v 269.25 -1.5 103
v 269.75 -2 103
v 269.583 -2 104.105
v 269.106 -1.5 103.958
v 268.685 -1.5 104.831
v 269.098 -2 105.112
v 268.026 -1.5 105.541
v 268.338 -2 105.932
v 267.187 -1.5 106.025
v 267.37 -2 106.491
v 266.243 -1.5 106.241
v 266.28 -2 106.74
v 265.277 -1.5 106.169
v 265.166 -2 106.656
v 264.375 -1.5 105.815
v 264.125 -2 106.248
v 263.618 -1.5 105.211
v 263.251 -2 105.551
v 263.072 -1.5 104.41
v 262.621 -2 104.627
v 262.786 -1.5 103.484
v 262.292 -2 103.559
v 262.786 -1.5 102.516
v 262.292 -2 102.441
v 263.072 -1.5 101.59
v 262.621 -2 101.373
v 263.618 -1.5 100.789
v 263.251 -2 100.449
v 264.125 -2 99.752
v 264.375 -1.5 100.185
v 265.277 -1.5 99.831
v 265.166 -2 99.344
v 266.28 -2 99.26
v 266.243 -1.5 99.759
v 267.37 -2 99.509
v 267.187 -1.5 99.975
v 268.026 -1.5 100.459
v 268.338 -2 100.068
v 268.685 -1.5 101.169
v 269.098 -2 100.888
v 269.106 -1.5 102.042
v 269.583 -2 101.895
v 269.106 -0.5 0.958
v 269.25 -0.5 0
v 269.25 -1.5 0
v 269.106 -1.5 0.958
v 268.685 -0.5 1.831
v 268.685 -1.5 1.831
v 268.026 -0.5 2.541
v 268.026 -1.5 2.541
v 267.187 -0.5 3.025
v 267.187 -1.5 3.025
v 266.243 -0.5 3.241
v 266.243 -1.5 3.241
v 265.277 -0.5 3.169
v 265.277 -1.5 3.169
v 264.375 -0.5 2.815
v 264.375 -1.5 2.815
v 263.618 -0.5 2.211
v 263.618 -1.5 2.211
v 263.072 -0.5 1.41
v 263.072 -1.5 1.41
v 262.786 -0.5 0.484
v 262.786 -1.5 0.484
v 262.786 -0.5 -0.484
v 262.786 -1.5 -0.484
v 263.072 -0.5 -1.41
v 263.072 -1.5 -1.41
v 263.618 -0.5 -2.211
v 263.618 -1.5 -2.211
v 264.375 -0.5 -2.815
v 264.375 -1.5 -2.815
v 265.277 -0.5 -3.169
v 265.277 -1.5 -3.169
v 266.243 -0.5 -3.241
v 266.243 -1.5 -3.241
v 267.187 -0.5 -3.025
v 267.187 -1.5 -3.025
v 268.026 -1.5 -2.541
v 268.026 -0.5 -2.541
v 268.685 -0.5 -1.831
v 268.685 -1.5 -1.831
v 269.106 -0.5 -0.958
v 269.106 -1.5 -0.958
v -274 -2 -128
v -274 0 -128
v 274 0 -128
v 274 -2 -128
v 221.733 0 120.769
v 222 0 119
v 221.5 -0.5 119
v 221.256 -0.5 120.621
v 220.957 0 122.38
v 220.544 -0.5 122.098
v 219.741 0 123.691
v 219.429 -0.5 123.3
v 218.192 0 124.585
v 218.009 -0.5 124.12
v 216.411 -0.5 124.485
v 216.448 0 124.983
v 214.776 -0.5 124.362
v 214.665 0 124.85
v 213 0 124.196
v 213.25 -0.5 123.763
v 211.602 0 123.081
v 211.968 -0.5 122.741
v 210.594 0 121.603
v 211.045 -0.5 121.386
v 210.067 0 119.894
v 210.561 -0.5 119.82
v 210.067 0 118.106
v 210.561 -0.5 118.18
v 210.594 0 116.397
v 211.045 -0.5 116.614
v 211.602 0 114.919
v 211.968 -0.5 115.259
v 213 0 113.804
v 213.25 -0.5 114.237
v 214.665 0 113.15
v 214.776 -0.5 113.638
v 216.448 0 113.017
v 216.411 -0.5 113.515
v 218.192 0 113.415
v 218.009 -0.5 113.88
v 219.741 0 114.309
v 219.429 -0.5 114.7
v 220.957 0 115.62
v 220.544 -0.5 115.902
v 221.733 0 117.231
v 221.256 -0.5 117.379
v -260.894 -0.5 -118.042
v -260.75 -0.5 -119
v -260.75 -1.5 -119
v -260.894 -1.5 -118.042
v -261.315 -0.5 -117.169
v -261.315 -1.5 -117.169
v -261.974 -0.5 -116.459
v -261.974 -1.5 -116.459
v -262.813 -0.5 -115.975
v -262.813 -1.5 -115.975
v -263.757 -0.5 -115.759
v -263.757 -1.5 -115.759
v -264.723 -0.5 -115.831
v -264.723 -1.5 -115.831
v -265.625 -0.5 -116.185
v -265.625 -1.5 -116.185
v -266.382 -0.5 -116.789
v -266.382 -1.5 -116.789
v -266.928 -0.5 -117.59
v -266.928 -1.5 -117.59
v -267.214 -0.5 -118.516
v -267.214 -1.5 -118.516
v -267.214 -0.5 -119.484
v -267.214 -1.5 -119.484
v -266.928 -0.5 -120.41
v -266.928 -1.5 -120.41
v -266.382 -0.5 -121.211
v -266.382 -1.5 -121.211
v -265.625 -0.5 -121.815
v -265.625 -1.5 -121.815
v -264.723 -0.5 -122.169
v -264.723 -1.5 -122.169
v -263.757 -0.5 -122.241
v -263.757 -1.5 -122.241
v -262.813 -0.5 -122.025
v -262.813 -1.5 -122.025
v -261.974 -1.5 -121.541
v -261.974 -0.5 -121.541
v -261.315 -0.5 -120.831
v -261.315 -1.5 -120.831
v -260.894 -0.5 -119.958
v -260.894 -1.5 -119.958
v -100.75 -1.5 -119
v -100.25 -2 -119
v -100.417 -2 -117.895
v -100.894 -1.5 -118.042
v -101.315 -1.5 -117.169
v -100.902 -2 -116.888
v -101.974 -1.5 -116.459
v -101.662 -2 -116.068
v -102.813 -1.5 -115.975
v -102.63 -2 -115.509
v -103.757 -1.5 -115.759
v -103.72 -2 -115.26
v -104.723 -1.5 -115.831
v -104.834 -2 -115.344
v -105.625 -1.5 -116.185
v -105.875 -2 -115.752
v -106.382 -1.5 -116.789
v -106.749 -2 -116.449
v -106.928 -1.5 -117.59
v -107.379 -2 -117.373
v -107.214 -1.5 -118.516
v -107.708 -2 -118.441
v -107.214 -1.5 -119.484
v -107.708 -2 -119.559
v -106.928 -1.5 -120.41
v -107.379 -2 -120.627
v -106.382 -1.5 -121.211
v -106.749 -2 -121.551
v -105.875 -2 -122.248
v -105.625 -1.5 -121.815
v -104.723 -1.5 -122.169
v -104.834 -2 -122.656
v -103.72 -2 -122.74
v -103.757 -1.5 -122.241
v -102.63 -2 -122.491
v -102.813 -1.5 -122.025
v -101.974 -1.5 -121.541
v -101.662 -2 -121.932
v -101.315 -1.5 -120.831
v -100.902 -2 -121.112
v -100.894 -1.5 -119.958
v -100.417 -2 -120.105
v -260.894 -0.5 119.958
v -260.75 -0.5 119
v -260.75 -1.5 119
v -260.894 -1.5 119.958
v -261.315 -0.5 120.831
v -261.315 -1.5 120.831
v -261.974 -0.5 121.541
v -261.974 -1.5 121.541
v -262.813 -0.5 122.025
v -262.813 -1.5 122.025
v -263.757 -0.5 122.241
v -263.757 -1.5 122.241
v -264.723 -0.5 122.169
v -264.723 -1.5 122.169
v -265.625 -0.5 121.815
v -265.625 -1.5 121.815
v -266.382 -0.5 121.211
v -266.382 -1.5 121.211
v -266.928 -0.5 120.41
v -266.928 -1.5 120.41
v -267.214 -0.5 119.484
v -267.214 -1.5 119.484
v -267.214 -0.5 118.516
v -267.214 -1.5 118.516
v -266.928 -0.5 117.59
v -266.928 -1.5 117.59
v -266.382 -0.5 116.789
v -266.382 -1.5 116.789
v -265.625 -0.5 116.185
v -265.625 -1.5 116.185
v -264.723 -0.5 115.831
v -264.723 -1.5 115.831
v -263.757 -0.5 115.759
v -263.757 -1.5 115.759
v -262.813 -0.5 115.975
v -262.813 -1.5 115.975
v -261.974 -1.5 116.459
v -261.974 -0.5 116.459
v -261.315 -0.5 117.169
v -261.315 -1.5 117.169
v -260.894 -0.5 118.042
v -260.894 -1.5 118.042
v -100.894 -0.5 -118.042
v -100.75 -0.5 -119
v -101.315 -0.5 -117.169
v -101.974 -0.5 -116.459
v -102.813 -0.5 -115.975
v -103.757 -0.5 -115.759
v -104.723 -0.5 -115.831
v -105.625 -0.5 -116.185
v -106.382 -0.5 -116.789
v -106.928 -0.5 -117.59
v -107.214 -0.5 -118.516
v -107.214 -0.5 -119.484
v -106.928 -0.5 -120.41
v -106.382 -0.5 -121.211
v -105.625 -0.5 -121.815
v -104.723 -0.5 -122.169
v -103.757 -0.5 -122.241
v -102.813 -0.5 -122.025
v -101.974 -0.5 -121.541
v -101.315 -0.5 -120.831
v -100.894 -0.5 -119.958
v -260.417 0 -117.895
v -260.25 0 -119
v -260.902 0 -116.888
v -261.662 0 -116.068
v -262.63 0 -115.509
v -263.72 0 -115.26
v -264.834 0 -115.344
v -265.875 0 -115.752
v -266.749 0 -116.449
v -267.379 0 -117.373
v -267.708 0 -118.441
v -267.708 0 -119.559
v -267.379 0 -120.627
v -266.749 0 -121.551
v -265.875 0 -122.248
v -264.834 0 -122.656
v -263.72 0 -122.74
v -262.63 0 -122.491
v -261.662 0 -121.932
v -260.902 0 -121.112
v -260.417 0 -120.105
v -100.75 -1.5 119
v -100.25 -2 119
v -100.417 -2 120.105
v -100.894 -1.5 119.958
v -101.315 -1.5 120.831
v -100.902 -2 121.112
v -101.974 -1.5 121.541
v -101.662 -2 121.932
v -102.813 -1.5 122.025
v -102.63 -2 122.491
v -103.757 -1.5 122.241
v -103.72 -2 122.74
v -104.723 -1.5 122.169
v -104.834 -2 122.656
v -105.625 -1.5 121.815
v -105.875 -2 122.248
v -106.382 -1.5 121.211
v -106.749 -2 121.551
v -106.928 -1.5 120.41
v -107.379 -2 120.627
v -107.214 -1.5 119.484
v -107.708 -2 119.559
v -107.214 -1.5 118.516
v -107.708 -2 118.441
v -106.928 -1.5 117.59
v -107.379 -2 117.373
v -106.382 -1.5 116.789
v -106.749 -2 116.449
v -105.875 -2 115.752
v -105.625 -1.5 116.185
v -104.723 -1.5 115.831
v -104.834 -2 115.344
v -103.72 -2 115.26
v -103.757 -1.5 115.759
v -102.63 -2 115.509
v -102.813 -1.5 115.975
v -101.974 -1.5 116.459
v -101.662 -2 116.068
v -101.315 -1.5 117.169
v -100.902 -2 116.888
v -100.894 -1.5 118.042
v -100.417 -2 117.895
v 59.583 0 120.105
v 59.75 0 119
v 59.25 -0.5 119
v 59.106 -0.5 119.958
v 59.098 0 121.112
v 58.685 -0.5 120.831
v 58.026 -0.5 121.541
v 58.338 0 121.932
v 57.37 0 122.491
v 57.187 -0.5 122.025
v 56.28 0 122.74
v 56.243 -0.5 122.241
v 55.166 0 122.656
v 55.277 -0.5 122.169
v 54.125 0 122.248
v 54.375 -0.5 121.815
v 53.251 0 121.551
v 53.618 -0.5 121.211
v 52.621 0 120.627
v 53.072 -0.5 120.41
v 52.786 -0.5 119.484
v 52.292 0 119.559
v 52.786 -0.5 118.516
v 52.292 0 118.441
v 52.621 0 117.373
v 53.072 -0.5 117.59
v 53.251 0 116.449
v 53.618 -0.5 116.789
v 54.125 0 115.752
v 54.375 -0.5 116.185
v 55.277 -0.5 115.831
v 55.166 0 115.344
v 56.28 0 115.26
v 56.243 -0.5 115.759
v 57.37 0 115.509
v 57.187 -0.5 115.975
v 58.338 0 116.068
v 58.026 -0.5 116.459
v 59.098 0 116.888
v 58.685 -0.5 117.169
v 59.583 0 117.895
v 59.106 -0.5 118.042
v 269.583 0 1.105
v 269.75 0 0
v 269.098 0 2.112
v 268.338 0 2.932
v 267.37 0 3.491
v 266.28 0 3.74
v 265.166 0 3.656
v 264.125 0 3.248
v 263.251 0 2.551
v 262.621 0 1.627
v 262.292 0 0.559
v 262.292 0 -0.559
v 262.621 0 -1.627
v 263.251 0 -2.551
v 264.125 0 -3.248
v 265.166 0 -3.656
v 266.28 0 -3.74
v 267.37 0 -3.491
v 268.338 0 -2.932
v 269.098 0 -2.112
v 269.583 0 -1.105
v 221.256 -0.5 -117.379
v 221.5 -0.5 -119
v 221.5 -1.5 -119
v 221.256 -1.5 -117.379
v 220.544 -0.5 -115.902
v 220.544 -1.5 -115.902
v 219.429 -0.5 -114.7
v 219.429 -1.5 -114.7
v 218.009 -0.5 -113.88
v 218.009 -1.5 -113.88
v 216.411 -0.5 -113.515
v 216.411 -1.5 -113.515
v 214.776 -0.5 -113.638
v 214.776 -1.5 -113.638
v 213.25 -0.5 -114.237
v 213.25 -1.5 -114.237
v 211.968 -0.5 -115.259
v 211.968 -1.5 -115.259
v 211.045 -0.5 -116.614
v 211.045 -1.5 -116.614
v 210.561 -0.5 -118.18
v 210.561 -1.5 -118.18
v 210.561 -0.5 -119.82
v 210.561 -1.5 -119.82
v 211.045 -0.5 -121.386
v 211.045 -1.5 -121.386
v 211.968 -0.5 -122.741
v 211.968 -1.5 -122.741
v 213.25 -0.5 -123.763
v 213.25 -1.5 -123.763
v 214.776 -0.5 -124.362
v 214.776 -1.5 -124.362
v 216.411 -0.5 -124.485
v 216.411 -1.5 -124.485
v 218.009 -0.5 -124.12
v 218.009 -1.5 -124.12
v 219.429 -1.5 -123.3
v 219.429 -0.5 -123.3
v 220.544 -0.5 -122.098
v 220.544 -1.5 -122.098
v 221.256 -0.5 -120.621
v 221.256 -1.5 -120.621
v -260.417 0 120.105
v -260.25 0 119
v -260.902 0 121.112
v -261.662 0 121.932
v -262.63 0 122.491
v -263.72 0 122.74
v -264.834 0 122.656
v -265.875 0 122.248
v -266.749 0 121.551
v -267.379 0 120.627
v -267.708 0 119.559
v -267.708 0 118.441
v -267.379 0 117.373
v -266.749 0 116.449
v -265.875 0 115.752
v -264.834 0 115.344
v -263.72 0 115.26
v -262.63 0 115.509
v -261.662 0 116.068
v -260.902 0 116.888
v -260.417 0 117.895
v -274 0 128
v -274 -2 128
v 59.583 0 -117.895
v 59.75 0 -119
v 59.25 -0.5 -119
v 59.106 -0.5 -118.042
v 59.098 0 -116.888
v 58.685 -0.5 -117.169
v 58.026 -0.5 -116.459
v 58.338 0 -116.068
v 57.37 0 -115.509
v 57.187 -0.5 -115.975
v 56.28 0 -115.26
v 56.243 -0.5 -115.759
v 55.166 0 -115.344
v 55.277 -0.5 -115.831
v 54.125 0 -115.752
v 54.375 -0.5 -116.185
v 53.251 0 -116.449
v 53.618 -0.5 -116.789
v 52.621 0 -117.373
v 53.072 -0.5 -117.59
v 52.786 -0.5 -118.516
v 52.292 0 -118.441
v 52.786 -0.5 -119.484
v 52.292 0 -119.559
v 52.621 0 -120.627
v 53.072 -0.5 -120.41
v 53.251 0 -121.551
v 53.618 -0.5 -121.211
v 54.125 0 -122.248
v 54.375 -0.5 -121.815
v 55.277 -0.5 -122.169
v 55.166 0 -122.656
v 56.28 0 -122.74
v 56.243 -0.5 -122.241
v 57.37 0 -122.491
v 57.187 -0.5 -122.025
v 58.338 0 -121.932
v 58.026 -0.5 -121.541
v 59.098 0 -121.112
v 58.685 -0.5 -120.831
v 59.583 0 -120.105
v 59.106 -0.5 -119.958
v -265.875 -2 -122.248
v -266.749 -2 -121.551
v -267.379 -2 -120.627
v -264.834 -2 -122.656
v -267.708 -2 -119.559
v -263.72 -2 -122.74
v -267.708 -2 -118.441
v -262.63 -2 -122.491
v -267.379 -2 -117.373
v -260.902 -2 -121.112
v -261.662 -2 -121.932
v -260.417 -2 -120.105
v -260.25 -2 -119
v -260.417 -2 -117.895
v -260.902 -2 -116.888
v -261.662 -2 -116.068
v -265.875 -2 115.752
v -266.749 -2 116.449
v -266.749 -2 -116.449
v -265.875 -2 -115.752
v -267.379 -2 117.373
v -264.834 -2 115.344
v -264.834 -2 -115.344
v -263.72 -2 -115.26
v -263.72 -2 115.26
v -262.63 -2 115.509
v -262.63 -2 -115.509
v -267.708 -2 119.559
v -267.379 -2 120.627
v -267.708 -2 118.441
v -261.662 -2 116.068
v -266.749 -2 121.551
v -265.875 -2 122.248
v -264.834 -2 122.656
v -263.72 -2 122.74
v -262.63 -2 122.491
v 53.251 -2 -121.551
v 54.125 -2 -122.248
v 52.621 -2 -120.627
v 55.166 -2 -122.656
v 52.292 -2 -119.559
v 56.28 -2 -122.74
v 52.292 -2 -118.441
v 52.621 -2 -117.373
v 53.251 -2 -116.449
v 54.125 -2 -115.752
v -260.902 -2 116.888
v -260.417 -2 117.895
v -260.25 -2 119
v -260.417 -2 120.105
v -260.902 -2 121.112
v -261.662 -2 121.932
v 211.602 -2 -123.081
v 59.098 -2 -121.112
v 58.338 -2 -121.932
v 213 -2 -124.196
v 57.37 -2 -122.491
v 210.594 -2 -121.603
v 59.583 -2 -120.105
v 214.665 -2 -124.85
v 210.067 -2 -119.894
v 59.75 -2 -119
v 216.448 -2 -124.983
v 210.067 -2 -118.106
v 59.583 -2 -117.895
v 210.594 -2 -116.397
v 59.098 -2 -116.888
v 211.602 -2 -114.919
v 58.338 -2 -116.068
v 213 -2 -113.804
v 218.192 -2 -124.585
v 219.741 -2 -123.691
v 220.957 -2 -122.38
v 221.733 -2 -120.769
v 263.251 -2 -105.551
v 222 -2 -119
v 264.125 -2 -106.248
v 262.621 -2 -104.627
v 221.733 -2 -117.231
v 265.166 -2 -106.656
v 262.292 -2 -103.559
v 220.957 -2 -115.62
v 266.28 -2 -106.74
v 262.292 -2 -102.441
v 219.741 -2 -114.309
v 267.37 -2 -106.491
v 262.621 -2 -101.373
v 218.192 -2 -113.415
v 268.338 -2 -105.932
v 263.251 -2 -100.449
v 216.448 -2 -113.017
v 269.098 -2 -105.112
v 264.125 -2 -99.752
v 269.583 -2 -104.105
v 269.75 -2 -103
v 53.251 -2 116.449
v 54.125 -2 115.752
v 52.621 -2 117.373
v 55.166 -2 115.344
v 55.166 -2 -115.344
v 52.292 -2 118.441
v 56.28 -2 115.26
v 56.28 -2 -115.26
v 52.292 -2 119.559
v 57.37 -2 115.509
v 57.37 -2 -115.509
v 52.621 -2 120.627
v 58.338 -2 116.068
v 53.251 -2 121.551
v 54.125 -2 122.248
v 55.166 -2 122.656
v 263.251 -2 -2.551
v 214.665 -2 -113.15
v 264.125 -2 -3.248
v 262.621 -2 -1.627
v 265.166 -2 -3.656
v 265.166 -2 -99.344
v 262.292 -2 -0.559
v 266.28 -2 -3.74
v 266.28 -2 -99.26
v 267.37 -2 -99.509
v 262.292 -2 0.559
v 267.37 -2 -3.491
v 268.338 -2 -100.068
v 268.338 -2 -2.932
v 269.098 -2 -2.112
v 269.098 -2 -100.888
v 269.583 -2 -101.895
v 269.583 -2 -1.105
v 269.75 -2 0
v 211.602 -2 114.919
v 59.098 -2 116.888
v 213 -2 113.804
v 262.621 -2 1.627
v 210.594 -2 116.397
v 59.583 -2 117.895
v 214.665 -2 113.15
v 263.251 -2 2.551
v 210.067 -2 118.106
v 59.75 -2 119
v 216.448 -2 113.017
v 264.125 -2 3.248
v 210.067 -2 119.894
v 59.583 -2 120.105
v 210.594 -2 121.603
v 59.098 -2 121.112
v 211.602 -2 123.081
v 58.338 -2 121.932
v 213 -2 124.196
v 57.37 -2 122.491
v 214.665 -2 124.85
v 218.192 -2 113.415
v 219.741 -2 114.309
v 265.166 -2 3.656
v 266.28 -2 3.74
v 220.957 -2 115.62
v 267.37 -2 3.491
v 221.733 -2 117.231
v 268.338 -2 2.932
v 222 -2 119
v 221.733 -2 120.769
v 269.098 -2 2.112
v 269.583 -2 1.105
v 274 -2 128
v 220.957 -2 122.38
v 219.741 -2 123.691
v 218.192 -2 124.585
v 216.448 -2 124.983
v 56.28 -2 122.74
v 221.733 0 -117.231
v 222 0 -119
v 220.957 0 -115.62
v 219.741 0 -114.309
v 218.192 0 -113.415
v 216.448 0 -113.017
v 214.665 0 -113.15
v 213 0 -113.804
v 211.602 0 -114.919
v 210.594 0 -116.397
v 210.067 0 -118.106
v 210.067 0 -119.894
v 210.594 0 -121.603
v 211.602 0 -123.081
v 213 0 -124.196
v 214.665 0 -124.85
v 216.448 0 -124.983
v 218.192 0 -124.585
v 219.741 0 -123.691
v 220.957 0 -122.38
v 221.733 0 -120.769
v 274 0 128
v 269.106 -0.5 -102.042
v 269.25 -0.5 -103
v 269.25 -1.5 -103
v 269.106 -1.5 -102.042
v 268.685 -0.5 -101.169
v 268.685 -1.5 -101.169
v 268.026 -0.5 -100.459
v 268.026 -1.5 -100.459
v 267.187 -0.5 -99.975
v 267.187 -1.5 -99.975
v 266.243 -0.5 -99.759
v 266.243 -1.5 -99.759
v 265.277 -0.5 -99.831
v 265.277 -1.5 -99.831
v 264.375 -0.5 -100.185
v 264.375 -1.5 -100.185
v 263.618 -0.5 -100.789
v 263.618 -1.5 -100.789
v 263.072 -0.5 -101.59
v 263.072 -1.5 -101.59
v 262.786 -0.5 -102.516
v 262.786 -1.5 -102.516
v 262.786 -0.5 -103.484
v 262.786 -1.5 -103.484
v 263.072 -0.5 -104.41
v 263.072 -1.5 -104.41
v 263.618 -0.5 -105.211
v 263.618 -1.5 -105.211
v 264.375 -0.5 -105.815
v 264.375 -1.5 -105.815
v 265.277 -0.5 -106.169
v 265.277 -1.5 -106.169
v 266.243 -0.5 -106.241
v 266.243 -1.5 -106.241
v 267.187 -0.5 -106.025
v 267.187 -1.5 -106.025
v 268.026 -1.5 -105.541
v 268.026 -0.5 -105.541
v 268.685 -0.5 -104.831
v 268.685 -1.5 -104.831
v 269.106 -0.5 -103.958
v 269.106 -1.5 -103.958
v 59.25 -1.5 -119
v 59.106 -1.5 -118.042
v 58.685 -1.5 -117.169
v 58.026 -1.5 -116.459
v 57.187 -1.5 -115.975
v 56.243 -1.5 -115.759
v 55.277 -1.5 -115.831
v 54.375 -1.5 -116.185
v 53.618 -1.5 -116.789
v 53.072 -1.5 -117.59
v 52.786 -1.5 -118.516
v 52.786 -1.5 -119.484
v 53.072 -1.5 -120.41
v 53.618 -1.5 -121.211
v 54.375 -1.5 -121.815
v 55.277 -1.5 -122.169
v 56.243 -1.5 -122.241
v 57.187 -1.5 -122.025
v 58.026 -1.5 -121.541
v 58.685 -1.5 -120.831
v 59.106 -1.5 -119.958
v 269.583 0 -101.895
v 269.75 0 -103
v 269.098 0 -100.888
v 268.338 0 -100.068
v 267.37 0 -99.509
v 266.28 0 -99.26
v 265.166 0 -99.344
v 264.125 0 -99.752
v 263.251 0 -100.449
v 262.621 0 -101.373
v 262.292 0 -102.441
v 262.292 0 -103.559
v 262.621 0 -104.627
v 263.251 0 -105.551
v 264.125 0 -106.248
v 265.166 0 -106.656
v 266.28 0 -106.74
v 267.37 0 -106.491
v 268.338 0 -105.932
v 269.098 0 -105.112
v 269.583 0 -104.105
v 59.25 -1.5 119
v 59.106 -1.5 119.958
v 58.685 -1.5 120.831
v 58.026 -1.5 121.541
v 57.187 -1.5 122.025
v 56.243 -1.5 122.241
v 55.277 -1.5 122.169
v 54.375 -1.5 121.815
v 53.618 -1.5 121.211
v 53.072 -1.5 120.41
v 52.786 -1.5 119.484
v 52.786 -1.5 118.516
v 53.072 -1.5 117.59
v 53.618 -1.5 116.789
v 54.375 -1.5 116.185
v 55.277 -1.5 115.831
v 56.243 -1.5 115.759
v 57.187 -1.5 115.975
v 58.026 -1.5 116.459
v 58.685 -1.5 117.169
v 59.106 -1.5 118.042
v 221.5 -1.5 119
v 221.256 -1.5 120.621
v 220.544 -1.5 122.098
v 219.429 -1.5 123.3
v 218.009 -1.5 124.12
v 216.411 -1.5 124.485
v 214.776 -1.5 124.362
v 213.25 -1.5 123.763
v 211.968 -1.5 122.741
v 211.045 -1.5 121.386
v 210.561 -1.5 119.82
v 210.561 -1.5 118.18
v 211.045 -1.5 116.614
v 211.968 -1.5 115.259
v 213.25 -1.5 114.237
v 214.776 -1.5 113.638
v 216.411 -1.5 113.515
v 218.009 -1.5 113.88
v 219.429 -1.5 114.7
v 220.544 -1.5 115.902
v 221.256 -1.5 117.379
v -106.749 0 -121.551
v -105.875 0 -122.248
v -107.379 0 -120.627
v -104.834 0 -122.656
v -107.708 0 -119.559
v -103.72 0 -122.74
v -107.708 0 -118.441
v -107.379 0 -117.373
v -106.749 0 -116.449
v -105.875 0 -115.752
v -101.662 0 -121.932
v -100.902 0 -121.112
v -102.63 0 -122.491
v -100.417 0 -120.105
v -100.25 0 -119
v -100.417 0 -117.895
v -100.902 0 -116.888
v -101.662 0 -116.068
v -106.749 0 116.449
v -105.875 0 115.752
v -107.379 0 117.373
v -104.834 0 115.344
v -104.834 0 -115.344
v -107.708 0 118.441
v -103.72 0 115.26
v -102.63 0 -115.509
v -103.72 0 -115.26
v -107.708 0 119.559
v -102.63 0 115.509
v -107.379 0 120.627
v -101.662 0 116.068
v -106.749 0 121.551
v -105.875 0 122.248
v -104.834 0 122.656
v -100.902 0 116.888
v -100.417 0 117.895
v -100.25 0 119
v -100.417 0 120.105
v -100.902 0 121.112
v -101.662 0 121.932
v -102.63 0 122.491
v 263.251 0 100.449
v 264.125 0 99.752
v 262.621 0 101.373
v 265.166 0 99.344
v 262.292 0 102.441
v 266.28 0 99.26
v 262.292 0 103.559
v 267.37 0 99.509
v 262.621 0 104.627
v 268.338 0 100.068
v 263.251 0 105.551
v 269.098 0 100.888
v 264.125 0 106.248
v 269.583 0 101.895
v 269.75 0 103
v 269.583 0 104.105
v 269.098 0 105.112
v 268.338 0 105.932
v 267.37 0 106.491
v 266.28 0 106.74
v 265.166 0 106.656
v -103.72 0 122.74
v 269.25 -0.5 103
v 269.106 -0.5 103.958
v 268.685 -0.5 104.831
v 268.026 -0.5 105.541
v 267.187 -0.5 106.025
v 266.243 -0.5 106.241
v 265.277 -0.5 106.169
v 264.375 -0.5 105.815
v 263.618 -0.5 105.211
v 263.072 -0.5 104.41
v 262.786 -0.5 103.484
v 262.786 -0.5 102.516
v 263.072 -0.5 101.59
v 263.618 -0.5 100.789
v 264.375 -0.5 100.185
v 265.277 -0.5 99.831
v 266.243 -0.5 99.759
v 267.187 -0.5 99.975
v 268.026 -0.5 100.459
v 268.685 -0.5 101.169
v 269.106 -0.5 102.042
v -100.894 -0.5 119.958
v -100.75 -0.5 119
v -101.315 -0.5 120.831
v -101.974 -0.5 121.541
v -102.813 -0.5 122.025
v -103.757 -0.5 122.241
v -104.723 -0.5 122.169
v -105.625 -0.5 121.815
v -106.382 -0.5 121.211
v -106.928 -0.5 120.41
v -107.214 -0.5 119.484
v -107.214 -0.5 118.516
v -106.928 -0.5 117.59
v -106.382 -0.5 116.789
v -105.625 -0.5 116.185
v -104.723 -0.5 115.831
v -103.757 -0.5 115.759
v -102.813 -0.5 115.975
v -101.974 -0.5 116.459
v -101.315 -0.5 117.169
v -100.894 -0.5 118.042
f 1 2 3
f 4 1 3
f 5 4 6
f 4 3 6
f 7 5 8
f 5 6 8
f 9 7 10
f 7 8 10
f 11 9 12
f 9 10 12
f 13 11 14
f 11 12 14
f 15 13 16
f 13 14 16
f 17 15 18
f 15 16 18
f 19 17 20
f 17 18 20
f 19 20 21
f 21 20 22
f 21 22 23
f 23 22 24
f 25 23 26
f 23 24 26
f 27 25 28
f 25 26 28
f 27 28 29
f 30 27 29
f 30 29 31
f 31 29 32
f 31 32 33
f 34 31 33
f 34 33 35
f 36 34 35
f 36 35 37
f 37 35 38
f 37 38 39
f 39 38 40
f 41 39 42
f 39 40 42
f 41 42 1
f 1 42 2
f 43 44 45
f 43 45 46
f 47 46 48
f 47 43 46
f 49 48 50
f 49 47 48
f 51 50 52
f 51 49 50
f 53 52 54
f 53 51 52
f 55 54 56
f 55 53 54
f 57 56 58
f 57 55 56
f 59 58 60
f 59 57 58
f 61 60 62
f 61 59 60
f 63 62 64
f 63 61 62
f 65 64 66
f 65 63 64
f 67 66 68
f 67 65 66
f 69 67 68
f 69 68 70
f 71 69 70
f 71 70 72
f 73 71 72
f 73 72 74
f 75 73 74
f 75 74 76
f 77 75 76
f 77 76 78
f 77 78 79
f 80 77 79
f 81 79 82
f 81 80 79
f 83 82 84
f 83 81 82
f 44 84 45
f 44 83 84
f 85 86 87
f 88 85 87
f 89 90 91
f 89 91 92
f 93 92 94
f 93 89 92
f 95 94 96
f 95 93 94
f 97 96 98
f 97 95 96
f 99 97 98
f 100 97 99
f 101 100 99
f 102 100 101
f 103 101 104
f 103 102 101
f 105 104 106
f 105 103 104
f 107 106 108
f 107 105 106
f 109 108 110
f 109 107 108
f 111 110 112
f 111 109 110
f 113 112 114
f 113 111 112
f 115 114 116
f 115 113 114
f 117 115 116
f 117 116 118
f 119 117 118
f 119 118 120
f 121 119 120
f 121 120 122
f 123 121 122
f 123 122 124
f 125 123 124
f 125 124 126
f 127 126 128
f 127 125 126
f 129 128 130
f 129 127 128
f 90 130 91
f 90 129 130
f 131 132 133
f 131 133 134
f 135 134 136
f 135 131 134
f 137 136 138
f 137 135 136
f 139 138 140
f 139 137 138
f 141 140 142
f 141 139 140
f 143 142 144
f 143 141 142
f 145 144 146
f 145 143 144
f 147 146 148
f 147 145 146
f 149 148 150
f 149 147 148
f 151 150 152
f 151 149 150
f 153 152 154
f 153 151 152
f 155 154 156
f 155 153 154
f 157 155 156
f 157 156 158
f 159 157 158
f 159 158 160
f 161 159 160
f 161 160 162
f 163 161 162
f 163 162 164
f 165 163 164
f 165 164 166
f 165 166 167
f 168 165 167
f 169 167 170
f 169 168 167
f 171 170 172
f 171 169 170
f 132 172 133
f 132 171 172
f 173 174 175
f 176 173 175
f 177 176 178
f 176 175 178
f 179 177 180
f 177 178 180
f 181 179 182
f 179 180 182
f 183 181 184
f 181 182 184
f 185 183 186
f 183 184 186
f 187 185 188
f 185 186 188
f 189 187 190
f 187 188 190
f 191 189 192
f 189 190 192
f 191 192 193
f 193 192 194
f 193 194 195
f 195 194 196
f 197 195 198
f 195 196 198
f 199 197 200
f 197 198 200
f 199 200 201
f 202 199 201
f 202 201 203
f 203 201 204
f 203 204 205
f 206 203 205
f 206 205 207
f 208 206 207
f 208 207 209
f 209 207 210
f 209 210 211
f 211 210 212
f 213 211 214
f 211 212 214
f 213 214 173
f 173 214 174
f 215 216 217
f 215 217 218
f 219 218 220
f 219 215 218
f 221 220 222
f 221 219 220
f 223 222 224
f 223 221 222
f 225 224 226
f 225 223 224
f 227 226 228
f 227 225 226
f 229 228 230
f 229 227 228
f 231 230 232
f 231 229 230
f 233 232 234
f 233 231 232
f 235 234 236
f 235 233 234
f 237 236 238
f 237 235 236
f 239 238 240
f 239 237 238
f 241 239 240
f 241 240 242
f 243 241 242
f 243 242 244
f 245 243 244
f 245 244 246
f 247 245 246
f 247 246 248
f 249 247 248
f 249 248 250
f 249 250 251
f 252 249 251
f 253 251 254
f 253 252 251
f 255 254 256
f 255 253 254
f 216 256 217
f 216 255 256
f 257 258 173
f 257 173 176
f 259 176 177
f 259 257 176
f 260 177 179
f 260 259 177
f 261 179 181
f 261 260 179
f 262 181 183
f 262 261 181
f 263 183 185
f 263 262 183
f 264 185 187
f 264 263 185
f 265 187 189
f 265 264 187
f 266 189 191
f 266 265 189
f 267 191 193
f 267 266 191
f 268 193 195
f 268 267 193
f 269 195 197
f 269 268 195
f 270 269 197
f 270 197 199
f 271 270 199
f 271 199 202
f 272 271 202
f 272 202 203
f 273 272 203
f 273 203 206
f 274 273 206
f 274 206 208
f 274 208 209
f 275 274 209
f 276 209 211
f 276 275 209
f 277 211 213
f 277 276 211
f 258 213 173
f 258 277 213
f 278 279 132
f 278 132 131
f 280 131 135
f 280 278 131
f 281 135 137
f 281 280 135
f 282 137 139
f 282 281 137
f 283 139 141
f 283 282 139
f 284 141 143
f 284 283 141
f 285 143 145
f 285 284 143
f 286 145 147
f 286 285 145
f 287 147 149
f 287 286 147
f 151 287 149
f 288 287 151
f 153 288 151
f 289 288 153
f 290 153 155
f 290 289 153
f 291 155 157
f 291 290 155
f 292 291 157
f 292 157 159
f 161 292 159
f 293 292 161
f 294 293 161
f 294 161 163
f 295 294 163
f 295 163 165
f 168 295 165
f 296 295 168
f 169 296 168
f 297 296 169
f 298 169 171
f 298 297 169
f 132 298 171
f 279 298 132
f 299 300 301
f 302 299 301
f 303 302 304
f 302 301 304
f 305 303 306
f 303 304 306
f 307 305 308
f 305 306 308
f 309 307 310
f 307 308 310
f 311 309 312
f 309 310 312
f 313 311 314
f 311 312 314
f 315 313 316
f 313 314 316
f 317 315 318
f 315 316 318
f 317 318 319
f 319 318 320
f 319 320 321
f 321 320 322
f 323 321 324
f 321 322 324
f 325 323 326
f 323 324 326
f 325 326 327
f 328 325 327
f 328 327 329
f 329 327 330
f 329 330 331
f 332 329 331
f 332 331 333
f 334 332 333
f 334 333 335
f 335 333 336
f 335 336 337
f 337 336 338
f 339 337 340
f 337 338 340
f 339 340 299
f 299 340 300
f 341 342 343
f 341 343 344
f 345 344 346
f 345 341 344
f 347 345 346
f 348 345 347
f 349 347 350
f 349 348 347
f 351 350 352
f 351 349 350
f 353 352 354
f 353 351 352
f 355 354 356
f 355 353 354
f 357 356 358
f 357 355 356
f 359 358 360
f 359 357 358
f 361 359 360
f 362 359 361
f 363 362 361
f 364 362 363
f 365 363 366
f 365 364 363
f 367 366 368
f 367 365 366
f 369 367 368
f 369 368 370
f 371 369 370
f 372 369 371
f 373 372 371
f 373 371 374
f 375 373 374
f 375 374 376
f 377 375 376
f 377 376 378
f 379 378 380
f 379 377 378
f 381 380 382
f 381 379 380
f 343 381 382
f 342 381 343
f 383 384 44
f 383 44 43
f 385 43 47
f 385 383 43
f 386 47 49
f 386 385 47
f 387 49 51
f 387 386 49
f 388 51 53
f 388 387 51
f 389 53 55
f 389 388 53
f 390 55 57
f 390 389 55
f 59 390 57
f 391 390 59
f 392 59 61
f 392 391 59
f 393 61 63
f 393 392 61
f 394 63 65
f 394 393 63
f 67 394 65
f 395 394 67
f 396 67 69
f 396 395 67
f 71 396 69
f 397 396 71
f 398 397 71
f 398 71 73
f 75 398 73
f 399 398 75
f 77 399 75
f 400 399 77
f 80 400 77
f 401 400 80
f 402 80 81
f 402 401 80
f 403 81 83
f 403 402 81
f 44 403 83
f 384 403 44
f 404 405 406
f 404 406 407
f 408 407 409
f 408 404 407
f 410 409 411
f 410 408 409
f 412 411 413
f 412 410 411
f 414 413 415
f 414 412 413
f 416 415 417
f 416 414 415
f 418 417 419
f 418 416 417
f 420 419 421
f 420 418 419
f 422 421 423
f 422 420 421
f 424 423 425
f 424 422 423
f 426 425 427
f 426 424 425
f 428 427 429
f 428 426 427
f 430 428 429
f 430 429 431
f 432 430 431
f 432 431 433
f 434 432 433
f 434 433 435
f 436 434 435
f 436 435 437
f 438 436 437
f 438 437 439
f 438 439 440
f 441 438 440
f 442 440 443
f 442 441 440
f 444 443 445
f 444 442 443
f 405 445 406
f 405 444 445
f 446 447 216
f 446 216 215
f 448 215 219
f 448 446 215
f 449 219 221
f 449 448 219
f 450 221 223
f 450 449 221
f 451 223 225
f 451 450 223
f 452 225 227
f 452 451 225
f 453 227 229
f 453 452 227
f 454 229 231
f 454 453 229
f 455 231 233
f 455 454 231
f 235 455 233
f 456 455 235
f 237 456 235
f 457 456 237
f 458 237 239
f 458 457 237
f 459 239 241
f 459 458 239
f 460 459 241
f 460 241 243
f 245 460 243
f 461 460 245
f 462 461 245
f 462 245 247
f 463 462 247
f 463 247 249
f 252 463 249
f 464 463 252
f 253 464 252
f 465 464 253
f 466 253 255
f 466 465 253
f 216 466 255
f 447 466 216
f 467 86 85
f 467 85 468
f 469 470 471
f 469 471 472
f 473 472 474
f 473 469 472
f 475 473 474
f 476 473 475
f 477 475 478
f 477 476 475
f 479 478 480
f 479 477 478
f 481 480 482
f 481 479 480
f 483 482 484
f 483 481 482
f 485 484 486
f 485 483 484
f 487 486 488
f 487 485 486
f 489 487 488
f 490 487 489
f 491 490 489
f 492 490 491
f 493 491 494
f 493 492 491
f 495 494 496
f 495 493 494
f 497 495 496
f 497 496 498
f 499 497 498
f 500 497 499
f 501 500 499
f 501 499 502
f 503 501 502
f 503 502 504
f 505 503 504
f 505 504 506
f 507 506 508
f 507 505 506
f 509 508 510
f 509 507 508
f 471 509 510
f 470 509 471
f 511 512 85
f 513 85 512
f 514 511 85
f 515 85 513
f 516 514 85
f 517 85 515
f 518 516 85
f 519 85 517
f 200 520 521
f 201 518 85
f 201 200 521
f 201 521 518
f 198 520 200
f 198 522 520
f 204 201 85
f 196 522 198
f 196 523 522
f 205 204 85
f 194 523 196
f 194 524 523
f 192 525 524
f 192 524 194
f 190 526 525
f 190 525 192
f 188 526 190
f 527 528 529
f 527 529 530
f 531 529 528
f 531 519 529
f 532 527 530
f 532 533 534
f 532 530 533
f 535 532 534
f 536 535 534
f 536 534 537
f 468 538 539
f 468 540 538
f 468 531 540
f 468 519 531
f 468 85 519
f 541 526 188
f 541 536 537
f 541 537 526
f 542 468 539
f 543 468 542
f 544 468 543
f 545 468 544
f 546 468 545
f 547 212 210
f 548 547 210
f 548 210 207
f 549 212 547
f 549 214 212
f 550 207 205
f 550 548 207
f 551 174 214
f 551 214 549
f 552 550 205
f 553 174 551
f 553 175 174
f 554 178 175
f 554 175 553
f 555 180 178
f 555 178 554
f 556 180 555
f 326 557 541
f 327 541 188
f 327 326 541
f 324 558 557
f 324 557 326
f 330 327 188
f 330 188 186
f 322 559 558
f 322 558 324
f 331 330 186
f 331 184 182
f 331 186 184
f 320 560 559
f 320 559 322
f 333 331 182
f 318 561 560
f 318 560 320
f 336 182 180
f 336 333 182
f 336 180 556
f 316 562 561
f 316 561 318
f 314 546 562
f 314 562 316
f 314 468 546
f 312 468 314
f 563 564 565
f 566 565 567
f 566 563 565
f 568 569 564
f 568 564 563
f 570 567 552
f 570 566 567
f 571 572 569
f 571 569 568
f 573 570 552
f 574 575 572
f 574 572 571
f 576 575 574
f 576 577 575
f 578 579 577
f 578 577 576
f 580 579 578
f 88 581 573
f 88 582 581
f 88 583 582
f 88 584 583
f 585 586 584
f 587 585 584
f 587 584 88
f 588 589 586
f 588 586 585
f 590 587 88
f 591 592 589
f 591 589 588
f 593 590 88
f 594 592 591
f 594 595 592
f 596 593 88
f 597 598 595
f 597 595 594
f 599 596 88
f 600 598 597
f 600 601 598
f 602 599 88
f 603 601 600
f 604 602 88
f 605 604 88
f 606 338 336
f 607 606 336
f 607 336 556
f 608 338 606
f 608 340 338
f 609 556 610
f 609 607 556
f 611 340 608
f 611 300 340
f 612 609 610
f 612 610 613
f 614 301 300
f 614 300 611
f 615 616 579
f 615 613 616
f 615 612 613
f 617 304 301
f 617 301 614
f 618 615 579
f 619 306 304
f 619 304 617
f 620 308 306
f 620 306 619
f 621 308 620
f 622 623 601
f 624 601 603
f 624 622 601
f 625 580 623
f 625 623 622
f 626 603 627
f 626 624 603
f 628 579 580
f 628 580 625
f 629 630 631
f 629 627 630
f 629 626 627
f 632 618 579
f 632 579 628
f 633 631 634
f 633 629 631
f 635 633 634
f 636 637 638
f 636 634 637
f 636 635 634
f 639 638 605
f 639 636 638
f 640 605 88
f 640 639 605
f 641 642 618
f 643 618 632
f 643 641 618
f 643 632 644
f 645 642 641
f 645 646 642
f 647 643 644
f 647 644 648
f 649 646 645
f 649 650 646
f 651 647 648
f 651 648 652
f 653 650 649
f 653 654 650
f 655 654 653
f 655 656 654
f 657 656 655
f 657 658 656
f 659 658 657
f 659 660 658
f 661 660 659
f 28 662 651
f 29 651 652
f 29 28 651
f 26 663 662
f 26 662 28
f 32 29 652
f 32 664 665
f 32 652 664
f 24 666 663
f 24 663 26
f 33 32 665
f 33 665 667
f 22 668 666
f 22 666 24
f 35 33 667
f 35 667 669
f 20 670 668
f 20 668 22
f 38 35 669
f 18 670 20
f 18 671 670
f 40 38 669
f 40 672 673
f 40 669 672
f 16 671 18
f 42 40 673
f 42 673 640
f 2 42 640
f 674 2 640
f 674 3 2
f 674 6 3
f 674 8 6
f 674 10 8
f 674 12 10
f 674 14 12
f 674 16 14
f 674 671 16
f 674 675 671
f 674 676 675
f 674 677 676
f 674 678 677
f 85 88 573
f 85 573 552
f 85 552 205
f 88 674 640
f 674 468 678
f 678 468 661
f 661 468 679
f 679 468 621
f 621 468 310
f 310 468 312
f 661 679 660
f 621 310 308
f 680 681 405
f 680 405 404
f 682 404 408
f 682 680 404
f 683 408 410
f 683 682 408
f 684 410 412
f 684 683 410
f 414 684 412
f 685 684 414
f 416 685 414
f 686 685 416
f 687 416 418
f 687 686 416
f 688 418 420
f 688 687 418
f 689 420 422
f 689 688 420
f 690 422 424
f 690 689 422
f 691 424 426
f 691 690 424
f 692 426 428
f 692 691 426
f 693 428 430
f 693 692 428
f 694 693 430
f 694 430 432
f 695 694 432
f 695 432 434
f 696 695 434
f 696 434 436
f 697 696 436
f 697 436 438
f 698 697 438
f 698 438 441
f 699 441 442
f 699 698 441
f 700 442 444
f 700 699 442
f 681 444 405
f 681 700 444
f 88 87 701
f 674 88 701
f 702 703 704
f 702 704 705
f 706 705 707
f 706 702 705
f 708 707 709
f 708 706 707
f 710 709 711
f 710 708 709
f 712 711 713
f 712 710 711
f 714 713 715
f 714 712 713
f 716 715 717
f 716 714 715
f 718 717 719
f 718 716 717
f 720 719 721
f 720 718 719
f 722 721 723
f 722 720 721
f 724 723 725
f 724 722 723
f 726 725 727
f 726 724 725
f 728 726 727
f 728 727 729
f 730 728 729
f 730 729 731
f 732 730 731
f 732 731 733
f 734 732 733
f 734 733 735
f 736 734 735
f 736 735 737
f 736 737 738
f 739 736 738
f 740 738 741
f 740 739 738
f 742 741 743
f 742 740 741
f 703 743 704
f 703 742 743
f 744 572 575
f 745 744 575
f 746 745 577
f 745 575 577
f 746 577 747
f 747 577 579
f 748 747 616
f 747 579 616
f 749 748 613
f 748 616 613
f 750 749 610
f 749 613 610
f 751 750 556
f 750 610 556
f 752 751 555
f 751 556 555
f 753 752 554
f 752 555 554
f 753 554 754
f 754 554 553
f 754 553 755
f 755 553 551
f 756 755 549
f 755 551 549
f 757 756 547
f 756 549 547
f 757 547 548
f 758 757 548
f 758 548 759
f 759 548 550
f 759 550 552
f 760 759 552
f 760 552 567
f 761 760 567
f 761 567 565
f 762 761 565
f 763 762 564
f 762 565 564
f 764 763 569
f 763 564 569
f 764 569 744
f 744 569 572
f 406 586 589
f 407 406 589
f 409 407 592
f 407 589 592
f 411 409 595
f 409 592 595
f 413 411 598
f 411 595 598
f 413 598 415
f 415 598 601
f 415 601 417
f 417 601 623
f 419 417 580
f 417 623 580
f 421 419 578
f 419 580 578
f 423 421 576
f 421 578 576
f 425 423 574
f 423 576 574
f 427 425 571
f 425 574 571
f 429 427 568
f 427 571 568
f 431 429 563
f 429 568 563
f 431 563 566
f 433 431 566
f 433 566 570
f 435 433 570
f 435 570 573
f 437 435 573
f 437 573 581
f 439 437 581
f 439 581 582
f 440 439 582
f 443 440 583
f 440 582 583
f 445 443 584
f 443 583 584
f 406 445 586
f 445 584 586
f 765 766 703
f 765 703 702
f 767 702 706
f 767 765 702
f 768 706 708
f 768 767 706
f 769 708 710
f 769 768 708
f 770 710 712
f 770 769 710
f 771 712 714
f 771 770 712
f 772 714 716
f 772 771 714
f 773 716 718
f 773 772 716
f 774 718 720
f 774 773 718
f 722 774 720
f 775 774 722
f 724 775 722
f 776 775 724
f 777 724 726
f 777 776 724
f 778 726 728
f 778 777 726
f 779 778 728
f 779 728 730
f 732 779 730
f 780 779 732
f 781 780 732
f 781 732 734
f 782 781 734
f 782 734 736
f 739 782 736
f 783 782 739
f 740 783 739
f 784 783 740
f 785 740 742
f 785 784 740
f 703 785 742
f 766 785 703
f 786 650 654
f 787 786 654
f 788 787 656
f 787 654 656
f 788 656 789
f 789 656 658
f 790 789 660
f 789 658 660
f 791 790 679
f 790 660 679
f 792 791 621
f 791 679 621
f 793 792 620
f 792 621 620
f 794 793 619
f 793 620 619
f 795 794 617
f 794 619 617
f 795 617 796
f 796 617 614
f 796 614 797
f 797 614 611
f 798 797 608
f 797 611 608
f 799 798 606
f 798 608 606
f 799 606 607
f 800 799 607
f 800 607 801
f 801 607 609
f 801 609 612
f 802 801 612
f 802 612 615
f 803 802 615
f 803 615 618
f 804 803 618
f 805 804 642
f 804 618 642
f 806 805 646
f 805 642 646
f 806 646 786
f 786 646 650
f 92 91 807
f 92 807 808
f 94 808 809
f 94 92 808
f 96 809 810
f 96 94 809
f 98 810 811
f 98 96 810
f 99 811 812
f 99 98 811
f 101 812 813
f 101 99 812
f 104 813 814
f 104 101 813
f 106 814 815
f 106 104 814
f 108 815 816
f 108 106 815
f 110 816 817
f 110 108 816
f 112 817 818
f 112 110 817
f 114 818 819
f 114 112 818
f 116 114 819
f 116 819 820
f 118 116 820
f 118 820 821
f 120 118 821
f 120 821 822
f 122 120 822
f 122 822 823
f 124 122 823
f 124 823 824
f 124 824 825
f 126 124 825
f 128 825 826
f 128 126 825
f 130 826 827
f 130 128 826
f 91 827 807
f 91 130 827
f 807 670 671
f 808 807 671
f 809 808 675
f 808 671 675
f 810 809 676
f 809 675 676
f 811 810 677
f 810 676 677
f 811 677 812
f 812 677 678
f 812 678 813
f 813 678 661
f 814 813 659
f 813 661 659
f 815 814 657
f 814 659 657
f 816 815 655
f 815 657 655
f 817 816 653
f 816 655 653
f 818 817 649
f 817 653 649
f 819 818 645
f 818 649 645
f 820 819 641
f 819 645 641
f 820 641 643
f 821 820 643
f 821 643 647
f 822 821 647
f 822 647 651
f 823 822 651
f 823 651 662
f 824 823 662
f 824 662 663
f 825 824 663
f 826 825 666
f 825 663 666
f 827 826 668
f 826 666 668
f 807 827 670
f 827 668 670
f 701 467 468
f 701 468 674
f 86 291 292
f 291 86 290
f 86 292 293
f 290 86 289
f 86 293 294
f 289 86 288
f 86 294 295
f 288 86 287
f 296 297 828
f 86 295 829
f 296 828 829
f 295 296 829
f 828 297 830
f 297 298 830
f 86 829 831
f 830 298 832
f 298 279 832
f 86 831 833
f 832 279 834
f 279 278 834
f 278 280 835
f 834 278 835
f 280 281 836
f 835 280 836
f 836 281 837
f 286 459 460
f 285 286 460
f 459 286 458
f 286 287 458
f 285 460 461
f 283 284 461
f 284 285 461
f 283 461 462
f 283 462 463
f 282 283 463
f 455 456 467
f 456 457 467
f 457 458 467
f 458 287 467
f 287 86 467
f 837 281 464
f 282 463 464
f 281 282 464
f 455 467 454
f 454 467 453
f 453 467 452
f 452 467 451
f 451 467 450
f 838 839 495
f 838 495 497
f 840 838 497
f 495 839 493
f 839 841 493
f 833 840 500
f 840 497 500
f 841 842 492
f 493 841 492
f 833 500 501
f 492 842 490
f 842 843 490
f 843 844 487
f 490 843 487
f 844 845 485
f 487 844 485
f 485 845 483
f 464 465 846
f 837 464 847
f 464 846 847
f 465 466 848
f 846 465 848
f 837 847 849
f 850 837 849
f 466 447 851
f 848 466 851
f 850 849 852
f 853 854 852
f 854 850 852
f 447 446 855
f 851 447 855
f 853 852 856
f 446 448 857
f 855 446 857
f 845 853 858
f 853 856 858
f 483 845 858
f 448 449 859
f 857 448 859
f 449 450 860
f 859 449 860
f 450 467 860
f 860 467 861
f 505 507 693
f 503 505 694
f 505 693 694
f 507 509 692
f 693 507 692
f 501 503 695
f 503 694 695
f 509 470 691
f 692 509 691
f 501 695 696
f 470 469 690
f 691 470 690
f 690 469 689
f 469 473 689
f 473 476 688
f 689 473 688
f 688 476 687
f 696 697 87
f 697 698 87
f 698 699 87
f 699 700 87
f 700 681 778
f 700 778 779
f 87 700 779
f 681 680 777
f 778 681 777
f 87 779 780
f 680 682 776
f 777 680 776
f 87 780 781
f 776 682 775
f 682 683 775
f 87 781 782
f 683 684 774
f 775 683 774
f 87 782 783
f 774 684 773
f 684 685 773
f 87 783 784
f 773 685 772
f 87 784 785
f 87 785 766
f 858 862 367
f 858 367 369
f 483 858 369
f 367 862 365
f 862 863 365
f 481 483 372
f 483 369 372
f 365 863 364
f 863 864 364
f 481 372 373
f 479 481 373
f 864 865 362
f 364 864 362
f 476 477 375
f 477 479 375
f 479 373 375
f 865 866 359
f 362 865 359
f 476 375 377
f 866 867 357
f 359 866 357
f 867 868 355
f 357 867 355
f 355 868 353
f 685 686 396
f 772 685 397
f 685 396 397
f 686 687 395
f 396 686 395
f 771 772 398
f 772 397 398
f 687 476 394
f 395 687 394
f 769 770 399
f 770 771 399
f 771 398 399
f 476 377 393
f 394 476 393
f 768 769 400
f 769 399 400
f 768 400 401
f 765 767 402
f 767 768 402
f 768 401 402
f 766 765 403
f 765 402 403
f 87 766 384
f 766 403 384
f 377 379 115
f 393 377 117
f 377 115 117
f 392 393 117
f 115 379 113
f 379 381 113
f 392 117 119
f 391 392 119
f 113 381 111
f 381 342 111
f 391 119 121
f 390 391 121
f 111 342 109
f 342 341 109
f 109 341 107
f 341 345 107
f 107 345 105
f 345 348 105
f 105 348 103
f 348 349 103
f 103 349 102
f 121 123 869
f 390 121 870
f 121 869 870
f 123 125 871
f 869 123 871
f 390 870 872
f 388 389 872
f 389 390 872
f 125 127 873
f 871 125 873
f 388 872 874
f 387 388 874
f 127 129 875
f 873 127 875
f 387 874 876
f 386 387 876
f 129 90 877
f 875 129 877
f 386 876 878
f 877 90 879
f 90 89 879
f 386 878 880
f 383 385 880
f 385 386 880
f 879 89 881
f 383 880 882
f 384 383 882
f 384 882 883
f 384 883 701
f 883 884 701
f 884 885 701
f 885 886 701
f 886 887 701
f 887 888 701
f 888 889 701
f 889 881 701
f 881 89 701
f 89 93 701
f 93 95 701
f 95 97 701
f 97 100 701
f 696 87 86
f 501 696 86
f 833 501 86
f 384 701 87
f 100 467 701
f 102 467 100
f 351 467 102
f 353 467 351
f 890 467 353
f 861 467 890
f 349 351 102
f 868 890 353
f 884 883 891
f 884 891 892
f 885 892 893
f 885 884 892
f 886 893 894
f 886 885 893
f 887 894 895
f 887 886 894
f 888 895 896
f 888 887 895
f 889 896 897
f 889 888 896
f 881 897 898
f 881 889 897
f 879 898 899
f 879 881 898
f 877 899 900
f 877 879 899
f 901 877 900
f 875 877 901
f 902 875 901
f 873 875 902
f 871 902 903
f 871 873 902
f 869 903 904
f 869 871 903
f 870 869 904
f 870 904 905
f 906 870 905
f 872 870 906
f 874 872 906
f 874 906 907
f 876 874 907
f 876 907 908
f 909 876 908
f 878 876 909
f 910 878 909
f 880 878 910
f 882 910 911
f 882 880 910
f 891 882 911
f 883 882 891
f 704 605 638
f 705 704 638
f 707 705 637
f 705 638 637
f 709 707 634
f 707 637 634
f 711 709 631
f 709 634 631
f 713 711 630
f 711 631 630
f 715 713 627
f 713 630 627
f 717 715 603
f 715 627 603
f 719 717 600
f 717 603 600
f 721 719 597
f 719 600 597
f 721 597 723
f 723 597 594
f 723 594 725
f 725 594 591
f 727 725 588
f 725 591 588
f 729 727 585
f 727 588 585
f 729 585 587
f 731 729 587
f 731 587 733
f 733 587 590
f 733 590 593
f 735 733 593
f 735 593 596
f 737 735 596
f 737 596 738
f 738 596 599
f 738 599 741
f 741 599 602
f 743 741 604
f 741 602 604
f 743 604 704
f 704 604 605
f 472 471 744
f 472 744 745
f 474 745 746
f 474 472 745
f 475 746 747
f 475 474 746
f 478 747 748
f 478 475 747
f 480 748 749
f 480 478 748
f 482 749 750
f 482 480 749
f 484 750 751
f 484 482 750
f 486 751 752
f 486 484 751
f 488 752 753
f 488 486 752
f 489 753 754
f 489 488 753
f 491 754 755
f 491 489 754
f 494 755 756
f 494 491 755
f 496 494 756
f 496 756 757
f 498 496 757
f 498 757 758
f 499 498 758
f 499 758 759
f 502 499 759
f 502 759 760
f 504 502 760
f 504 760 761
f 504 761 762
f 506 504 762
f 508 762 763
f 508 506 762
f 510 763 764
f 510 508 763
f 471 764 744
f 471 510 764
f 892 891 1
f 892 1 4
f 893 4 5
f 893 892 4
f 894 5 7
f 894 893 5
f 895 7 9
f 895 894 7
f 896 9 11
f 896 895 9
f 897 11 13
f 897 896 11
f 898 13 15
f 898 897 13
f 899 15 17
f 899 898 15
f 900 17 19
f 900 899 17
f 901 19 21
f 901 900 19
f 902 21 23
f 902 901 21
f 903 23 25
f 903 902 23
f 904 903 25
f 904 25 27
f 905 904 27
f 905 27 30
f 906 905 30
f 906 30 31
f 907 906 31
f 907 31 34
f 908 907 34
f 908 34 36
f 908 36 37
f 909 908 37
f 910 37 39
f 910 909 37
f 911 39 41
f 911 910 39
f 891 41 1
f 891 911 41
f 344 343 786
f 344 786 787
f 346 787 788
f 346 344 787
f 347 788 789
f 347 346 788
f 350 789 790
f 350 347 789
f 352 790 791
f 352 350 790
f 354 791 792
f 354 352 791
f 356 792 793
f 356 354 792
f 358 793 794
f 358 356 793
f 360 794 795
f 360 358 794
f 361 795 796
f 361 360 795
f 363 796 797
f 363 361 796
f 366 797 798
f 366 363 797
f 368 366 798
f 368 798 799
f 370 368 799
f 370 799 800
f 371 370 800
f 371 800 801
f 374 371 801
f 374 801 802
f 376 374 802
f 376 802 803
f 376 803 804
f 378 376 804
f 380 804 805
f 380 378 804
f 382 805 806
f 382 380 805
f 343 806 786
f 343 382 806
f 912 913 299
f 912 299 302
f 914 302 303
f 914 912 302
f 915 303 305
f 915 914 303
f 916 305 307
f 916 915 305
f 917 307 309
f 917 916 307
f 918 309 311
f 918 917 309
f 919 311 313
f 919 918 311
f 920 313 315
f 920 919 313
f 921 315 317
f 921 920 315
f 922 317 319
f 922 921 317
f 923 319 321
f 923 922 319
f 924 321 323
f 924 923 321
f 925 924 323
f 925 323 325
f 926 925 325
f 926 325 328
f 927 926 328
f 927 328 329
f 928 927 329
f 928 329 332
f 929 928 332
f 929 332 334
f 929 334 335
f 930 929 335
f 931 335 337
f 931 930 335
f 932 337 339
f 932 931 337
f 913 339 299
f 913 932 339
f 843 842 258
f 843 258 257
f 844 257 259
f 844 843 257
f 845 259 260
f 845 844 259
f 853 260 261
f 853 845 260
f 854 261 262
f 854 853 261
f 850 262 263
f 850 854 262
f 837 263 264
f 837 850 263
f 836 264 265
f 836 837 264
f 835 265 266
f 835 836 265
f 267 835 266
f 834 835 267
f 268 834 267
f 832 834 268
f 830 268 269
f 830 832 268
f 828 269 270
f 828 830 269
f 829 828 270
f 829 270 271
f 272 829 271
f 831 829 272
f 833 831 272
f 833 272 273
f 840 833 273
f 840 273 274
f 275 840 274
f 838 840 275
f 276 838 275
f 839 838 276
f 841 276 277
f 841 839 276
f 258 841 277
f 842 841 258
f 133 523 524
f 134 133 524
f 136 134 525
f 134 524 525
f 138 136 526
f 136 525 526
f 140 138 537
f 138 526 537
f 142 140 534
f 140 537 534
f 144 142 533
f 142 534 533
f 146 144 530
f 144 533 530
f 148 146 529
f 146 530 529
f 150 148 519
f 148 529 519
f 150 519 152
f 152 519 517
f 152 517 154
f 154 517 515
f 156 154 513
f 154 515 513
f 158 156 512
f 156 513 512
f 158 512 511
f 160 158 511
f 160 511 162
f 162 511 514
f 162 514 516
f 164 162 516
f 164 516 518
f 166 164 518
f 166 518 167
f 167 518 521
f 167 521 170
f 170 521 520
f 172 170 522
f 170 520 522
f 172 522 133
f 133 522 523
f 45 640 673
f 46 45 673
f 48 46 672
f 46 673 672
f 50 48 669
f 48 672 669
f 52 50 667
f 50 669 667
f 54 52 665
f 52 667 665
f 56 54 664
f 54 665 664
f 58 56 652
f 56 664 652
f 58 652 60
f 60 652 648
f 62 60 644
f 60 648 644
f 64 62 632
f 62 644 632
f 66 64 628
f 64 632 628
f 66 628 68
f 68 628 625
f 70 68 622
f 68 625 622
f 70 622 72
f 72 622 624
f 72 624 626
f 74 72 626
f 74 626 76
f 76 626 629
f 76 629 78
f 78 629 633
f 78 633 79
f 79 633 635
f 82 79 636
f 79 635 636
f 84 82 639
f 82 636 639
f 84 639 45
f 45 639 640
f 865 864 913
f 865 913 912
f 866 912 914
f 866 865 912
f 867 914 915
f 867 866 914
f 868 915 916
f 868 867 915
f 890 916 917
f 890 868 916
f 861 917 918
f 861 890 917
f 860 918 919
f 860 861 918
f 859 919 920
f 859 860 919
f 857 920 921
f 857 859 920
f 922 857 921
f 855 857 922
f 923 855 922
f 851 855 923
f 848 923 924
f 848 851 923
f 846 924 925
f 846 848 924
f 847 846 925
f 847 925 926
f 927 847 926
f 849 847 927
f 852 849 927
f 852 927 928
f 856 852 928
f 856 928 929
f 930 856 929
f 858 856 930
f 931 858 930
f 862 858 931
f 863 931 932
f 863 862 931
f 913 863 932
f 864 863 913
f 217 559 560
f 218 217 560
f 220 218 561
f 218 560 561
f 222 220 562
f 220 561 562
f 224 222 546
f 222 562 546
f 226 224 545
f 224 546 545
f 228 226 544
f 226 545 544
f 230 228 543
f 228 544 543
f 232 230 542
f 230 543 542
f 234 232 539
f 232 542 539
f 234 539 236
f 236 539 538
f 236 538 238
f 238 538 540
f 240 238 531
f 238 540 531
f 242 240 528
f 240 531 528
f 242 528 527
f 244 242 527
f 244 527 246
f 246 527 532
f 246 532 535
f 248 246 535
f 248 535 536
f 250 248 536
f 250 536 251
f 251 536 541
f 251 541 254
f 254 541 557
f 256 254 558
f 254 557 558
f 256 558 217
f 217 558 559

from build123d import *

# Parameters (mm, degrees)
F0_W     = 548
F0_H     = 256
F0_R     = 3.25
F0_R_2   = 5.5
F1_DEPTH = 2
F2_SIZE  = 0.5


with BuildPart() as f1:
    # F0 (on Front) → F1 (new body)
    with BuildSketch(Plane.XZ):
        Rectangle(F0_W, F0_H)
        with Locations((-264, -119)):
            Circle(F0_R, mode=Mode.SUBTRACT)
        with Locations((-104, -119)):
            Circle(F0_R, mode=Mode.SUBTRACT)
        with Locations((56, -119)):
            Circle(F0_R, mode=Mode.SUBTRACT)
        with Locations((216, -119)):
            Circle(F0_R_2, mode=Mode.SUBTRACT)
        with Locations((266, -103)):
            Circle(F0_R, mode=Mode.SUBTRACT)
        with Locations((-264, 119)):
            Circle(F0_R, mode=Mode.SUBTRACT)
        with Locations((-104, 119)):
            Circle(F0_R, mode=Mode.SUBTRACT)
        with Locations((266, 0)):
            Circle(F0_R, mode=Mode.SUBTRACT)
        with Locations((56, 119)):
            Circle(F0_R, mode=Mode.SUBTRACT)
        with Locations((266, 103)):
            Circle(F0_R, mode=Mode.SUBTRACT)
        with Locations((216, 119)):
            Circle(F0_R_2, mode=Mode.SUBTRACT)
    extrude(amount=F1_DEPTH)

    # F2
    f2_edges = [f1.edges().sort_by_distance(p)[0] for p in [
        (-260.75, -1, 119),
        (-267.25, 0, 119),
        (-267.25, -2, 119),
        (-100.75, -1, 119),
        (-107.25, 0, 119),
        (-107.25, -2, 119),
        (59.25, -1, 119),
        (52.75, 0, 119),
        (52.75, -2, 119),
        (269.25, -1, 103),
        (262.75, 0, 103),
        (262.75, -2, 103),
        (269.25, -1, 0),
        (262.75, 0, 0),
        (262.75, -2, 0),
        (269.25, -1, -103),
        (262.75, 0, -103),
        (262.75, -2, -103),
        (59.25, -1, -119),
        (52.75, 0, -119),
        (52.75, -2, -119),
        (-100.75, -1, -119),
        (-107.25, 0, -119),
        (-107.25, -2, -119),
        (-260.75, -1, -119),
        (-267.25, 0, -119),
        (-267.25, -2, -119),
        (221.5, -1, 119),
        (210.5, 0, 119),
        (210.5, -2, 119),
        (221.5, -1, -119),
        (210.5, 0, -119),
        (210.5, -2, -119),
    ]]
    chamfer(f2_edges, length=F2_SIZE)


solid = f1.part
